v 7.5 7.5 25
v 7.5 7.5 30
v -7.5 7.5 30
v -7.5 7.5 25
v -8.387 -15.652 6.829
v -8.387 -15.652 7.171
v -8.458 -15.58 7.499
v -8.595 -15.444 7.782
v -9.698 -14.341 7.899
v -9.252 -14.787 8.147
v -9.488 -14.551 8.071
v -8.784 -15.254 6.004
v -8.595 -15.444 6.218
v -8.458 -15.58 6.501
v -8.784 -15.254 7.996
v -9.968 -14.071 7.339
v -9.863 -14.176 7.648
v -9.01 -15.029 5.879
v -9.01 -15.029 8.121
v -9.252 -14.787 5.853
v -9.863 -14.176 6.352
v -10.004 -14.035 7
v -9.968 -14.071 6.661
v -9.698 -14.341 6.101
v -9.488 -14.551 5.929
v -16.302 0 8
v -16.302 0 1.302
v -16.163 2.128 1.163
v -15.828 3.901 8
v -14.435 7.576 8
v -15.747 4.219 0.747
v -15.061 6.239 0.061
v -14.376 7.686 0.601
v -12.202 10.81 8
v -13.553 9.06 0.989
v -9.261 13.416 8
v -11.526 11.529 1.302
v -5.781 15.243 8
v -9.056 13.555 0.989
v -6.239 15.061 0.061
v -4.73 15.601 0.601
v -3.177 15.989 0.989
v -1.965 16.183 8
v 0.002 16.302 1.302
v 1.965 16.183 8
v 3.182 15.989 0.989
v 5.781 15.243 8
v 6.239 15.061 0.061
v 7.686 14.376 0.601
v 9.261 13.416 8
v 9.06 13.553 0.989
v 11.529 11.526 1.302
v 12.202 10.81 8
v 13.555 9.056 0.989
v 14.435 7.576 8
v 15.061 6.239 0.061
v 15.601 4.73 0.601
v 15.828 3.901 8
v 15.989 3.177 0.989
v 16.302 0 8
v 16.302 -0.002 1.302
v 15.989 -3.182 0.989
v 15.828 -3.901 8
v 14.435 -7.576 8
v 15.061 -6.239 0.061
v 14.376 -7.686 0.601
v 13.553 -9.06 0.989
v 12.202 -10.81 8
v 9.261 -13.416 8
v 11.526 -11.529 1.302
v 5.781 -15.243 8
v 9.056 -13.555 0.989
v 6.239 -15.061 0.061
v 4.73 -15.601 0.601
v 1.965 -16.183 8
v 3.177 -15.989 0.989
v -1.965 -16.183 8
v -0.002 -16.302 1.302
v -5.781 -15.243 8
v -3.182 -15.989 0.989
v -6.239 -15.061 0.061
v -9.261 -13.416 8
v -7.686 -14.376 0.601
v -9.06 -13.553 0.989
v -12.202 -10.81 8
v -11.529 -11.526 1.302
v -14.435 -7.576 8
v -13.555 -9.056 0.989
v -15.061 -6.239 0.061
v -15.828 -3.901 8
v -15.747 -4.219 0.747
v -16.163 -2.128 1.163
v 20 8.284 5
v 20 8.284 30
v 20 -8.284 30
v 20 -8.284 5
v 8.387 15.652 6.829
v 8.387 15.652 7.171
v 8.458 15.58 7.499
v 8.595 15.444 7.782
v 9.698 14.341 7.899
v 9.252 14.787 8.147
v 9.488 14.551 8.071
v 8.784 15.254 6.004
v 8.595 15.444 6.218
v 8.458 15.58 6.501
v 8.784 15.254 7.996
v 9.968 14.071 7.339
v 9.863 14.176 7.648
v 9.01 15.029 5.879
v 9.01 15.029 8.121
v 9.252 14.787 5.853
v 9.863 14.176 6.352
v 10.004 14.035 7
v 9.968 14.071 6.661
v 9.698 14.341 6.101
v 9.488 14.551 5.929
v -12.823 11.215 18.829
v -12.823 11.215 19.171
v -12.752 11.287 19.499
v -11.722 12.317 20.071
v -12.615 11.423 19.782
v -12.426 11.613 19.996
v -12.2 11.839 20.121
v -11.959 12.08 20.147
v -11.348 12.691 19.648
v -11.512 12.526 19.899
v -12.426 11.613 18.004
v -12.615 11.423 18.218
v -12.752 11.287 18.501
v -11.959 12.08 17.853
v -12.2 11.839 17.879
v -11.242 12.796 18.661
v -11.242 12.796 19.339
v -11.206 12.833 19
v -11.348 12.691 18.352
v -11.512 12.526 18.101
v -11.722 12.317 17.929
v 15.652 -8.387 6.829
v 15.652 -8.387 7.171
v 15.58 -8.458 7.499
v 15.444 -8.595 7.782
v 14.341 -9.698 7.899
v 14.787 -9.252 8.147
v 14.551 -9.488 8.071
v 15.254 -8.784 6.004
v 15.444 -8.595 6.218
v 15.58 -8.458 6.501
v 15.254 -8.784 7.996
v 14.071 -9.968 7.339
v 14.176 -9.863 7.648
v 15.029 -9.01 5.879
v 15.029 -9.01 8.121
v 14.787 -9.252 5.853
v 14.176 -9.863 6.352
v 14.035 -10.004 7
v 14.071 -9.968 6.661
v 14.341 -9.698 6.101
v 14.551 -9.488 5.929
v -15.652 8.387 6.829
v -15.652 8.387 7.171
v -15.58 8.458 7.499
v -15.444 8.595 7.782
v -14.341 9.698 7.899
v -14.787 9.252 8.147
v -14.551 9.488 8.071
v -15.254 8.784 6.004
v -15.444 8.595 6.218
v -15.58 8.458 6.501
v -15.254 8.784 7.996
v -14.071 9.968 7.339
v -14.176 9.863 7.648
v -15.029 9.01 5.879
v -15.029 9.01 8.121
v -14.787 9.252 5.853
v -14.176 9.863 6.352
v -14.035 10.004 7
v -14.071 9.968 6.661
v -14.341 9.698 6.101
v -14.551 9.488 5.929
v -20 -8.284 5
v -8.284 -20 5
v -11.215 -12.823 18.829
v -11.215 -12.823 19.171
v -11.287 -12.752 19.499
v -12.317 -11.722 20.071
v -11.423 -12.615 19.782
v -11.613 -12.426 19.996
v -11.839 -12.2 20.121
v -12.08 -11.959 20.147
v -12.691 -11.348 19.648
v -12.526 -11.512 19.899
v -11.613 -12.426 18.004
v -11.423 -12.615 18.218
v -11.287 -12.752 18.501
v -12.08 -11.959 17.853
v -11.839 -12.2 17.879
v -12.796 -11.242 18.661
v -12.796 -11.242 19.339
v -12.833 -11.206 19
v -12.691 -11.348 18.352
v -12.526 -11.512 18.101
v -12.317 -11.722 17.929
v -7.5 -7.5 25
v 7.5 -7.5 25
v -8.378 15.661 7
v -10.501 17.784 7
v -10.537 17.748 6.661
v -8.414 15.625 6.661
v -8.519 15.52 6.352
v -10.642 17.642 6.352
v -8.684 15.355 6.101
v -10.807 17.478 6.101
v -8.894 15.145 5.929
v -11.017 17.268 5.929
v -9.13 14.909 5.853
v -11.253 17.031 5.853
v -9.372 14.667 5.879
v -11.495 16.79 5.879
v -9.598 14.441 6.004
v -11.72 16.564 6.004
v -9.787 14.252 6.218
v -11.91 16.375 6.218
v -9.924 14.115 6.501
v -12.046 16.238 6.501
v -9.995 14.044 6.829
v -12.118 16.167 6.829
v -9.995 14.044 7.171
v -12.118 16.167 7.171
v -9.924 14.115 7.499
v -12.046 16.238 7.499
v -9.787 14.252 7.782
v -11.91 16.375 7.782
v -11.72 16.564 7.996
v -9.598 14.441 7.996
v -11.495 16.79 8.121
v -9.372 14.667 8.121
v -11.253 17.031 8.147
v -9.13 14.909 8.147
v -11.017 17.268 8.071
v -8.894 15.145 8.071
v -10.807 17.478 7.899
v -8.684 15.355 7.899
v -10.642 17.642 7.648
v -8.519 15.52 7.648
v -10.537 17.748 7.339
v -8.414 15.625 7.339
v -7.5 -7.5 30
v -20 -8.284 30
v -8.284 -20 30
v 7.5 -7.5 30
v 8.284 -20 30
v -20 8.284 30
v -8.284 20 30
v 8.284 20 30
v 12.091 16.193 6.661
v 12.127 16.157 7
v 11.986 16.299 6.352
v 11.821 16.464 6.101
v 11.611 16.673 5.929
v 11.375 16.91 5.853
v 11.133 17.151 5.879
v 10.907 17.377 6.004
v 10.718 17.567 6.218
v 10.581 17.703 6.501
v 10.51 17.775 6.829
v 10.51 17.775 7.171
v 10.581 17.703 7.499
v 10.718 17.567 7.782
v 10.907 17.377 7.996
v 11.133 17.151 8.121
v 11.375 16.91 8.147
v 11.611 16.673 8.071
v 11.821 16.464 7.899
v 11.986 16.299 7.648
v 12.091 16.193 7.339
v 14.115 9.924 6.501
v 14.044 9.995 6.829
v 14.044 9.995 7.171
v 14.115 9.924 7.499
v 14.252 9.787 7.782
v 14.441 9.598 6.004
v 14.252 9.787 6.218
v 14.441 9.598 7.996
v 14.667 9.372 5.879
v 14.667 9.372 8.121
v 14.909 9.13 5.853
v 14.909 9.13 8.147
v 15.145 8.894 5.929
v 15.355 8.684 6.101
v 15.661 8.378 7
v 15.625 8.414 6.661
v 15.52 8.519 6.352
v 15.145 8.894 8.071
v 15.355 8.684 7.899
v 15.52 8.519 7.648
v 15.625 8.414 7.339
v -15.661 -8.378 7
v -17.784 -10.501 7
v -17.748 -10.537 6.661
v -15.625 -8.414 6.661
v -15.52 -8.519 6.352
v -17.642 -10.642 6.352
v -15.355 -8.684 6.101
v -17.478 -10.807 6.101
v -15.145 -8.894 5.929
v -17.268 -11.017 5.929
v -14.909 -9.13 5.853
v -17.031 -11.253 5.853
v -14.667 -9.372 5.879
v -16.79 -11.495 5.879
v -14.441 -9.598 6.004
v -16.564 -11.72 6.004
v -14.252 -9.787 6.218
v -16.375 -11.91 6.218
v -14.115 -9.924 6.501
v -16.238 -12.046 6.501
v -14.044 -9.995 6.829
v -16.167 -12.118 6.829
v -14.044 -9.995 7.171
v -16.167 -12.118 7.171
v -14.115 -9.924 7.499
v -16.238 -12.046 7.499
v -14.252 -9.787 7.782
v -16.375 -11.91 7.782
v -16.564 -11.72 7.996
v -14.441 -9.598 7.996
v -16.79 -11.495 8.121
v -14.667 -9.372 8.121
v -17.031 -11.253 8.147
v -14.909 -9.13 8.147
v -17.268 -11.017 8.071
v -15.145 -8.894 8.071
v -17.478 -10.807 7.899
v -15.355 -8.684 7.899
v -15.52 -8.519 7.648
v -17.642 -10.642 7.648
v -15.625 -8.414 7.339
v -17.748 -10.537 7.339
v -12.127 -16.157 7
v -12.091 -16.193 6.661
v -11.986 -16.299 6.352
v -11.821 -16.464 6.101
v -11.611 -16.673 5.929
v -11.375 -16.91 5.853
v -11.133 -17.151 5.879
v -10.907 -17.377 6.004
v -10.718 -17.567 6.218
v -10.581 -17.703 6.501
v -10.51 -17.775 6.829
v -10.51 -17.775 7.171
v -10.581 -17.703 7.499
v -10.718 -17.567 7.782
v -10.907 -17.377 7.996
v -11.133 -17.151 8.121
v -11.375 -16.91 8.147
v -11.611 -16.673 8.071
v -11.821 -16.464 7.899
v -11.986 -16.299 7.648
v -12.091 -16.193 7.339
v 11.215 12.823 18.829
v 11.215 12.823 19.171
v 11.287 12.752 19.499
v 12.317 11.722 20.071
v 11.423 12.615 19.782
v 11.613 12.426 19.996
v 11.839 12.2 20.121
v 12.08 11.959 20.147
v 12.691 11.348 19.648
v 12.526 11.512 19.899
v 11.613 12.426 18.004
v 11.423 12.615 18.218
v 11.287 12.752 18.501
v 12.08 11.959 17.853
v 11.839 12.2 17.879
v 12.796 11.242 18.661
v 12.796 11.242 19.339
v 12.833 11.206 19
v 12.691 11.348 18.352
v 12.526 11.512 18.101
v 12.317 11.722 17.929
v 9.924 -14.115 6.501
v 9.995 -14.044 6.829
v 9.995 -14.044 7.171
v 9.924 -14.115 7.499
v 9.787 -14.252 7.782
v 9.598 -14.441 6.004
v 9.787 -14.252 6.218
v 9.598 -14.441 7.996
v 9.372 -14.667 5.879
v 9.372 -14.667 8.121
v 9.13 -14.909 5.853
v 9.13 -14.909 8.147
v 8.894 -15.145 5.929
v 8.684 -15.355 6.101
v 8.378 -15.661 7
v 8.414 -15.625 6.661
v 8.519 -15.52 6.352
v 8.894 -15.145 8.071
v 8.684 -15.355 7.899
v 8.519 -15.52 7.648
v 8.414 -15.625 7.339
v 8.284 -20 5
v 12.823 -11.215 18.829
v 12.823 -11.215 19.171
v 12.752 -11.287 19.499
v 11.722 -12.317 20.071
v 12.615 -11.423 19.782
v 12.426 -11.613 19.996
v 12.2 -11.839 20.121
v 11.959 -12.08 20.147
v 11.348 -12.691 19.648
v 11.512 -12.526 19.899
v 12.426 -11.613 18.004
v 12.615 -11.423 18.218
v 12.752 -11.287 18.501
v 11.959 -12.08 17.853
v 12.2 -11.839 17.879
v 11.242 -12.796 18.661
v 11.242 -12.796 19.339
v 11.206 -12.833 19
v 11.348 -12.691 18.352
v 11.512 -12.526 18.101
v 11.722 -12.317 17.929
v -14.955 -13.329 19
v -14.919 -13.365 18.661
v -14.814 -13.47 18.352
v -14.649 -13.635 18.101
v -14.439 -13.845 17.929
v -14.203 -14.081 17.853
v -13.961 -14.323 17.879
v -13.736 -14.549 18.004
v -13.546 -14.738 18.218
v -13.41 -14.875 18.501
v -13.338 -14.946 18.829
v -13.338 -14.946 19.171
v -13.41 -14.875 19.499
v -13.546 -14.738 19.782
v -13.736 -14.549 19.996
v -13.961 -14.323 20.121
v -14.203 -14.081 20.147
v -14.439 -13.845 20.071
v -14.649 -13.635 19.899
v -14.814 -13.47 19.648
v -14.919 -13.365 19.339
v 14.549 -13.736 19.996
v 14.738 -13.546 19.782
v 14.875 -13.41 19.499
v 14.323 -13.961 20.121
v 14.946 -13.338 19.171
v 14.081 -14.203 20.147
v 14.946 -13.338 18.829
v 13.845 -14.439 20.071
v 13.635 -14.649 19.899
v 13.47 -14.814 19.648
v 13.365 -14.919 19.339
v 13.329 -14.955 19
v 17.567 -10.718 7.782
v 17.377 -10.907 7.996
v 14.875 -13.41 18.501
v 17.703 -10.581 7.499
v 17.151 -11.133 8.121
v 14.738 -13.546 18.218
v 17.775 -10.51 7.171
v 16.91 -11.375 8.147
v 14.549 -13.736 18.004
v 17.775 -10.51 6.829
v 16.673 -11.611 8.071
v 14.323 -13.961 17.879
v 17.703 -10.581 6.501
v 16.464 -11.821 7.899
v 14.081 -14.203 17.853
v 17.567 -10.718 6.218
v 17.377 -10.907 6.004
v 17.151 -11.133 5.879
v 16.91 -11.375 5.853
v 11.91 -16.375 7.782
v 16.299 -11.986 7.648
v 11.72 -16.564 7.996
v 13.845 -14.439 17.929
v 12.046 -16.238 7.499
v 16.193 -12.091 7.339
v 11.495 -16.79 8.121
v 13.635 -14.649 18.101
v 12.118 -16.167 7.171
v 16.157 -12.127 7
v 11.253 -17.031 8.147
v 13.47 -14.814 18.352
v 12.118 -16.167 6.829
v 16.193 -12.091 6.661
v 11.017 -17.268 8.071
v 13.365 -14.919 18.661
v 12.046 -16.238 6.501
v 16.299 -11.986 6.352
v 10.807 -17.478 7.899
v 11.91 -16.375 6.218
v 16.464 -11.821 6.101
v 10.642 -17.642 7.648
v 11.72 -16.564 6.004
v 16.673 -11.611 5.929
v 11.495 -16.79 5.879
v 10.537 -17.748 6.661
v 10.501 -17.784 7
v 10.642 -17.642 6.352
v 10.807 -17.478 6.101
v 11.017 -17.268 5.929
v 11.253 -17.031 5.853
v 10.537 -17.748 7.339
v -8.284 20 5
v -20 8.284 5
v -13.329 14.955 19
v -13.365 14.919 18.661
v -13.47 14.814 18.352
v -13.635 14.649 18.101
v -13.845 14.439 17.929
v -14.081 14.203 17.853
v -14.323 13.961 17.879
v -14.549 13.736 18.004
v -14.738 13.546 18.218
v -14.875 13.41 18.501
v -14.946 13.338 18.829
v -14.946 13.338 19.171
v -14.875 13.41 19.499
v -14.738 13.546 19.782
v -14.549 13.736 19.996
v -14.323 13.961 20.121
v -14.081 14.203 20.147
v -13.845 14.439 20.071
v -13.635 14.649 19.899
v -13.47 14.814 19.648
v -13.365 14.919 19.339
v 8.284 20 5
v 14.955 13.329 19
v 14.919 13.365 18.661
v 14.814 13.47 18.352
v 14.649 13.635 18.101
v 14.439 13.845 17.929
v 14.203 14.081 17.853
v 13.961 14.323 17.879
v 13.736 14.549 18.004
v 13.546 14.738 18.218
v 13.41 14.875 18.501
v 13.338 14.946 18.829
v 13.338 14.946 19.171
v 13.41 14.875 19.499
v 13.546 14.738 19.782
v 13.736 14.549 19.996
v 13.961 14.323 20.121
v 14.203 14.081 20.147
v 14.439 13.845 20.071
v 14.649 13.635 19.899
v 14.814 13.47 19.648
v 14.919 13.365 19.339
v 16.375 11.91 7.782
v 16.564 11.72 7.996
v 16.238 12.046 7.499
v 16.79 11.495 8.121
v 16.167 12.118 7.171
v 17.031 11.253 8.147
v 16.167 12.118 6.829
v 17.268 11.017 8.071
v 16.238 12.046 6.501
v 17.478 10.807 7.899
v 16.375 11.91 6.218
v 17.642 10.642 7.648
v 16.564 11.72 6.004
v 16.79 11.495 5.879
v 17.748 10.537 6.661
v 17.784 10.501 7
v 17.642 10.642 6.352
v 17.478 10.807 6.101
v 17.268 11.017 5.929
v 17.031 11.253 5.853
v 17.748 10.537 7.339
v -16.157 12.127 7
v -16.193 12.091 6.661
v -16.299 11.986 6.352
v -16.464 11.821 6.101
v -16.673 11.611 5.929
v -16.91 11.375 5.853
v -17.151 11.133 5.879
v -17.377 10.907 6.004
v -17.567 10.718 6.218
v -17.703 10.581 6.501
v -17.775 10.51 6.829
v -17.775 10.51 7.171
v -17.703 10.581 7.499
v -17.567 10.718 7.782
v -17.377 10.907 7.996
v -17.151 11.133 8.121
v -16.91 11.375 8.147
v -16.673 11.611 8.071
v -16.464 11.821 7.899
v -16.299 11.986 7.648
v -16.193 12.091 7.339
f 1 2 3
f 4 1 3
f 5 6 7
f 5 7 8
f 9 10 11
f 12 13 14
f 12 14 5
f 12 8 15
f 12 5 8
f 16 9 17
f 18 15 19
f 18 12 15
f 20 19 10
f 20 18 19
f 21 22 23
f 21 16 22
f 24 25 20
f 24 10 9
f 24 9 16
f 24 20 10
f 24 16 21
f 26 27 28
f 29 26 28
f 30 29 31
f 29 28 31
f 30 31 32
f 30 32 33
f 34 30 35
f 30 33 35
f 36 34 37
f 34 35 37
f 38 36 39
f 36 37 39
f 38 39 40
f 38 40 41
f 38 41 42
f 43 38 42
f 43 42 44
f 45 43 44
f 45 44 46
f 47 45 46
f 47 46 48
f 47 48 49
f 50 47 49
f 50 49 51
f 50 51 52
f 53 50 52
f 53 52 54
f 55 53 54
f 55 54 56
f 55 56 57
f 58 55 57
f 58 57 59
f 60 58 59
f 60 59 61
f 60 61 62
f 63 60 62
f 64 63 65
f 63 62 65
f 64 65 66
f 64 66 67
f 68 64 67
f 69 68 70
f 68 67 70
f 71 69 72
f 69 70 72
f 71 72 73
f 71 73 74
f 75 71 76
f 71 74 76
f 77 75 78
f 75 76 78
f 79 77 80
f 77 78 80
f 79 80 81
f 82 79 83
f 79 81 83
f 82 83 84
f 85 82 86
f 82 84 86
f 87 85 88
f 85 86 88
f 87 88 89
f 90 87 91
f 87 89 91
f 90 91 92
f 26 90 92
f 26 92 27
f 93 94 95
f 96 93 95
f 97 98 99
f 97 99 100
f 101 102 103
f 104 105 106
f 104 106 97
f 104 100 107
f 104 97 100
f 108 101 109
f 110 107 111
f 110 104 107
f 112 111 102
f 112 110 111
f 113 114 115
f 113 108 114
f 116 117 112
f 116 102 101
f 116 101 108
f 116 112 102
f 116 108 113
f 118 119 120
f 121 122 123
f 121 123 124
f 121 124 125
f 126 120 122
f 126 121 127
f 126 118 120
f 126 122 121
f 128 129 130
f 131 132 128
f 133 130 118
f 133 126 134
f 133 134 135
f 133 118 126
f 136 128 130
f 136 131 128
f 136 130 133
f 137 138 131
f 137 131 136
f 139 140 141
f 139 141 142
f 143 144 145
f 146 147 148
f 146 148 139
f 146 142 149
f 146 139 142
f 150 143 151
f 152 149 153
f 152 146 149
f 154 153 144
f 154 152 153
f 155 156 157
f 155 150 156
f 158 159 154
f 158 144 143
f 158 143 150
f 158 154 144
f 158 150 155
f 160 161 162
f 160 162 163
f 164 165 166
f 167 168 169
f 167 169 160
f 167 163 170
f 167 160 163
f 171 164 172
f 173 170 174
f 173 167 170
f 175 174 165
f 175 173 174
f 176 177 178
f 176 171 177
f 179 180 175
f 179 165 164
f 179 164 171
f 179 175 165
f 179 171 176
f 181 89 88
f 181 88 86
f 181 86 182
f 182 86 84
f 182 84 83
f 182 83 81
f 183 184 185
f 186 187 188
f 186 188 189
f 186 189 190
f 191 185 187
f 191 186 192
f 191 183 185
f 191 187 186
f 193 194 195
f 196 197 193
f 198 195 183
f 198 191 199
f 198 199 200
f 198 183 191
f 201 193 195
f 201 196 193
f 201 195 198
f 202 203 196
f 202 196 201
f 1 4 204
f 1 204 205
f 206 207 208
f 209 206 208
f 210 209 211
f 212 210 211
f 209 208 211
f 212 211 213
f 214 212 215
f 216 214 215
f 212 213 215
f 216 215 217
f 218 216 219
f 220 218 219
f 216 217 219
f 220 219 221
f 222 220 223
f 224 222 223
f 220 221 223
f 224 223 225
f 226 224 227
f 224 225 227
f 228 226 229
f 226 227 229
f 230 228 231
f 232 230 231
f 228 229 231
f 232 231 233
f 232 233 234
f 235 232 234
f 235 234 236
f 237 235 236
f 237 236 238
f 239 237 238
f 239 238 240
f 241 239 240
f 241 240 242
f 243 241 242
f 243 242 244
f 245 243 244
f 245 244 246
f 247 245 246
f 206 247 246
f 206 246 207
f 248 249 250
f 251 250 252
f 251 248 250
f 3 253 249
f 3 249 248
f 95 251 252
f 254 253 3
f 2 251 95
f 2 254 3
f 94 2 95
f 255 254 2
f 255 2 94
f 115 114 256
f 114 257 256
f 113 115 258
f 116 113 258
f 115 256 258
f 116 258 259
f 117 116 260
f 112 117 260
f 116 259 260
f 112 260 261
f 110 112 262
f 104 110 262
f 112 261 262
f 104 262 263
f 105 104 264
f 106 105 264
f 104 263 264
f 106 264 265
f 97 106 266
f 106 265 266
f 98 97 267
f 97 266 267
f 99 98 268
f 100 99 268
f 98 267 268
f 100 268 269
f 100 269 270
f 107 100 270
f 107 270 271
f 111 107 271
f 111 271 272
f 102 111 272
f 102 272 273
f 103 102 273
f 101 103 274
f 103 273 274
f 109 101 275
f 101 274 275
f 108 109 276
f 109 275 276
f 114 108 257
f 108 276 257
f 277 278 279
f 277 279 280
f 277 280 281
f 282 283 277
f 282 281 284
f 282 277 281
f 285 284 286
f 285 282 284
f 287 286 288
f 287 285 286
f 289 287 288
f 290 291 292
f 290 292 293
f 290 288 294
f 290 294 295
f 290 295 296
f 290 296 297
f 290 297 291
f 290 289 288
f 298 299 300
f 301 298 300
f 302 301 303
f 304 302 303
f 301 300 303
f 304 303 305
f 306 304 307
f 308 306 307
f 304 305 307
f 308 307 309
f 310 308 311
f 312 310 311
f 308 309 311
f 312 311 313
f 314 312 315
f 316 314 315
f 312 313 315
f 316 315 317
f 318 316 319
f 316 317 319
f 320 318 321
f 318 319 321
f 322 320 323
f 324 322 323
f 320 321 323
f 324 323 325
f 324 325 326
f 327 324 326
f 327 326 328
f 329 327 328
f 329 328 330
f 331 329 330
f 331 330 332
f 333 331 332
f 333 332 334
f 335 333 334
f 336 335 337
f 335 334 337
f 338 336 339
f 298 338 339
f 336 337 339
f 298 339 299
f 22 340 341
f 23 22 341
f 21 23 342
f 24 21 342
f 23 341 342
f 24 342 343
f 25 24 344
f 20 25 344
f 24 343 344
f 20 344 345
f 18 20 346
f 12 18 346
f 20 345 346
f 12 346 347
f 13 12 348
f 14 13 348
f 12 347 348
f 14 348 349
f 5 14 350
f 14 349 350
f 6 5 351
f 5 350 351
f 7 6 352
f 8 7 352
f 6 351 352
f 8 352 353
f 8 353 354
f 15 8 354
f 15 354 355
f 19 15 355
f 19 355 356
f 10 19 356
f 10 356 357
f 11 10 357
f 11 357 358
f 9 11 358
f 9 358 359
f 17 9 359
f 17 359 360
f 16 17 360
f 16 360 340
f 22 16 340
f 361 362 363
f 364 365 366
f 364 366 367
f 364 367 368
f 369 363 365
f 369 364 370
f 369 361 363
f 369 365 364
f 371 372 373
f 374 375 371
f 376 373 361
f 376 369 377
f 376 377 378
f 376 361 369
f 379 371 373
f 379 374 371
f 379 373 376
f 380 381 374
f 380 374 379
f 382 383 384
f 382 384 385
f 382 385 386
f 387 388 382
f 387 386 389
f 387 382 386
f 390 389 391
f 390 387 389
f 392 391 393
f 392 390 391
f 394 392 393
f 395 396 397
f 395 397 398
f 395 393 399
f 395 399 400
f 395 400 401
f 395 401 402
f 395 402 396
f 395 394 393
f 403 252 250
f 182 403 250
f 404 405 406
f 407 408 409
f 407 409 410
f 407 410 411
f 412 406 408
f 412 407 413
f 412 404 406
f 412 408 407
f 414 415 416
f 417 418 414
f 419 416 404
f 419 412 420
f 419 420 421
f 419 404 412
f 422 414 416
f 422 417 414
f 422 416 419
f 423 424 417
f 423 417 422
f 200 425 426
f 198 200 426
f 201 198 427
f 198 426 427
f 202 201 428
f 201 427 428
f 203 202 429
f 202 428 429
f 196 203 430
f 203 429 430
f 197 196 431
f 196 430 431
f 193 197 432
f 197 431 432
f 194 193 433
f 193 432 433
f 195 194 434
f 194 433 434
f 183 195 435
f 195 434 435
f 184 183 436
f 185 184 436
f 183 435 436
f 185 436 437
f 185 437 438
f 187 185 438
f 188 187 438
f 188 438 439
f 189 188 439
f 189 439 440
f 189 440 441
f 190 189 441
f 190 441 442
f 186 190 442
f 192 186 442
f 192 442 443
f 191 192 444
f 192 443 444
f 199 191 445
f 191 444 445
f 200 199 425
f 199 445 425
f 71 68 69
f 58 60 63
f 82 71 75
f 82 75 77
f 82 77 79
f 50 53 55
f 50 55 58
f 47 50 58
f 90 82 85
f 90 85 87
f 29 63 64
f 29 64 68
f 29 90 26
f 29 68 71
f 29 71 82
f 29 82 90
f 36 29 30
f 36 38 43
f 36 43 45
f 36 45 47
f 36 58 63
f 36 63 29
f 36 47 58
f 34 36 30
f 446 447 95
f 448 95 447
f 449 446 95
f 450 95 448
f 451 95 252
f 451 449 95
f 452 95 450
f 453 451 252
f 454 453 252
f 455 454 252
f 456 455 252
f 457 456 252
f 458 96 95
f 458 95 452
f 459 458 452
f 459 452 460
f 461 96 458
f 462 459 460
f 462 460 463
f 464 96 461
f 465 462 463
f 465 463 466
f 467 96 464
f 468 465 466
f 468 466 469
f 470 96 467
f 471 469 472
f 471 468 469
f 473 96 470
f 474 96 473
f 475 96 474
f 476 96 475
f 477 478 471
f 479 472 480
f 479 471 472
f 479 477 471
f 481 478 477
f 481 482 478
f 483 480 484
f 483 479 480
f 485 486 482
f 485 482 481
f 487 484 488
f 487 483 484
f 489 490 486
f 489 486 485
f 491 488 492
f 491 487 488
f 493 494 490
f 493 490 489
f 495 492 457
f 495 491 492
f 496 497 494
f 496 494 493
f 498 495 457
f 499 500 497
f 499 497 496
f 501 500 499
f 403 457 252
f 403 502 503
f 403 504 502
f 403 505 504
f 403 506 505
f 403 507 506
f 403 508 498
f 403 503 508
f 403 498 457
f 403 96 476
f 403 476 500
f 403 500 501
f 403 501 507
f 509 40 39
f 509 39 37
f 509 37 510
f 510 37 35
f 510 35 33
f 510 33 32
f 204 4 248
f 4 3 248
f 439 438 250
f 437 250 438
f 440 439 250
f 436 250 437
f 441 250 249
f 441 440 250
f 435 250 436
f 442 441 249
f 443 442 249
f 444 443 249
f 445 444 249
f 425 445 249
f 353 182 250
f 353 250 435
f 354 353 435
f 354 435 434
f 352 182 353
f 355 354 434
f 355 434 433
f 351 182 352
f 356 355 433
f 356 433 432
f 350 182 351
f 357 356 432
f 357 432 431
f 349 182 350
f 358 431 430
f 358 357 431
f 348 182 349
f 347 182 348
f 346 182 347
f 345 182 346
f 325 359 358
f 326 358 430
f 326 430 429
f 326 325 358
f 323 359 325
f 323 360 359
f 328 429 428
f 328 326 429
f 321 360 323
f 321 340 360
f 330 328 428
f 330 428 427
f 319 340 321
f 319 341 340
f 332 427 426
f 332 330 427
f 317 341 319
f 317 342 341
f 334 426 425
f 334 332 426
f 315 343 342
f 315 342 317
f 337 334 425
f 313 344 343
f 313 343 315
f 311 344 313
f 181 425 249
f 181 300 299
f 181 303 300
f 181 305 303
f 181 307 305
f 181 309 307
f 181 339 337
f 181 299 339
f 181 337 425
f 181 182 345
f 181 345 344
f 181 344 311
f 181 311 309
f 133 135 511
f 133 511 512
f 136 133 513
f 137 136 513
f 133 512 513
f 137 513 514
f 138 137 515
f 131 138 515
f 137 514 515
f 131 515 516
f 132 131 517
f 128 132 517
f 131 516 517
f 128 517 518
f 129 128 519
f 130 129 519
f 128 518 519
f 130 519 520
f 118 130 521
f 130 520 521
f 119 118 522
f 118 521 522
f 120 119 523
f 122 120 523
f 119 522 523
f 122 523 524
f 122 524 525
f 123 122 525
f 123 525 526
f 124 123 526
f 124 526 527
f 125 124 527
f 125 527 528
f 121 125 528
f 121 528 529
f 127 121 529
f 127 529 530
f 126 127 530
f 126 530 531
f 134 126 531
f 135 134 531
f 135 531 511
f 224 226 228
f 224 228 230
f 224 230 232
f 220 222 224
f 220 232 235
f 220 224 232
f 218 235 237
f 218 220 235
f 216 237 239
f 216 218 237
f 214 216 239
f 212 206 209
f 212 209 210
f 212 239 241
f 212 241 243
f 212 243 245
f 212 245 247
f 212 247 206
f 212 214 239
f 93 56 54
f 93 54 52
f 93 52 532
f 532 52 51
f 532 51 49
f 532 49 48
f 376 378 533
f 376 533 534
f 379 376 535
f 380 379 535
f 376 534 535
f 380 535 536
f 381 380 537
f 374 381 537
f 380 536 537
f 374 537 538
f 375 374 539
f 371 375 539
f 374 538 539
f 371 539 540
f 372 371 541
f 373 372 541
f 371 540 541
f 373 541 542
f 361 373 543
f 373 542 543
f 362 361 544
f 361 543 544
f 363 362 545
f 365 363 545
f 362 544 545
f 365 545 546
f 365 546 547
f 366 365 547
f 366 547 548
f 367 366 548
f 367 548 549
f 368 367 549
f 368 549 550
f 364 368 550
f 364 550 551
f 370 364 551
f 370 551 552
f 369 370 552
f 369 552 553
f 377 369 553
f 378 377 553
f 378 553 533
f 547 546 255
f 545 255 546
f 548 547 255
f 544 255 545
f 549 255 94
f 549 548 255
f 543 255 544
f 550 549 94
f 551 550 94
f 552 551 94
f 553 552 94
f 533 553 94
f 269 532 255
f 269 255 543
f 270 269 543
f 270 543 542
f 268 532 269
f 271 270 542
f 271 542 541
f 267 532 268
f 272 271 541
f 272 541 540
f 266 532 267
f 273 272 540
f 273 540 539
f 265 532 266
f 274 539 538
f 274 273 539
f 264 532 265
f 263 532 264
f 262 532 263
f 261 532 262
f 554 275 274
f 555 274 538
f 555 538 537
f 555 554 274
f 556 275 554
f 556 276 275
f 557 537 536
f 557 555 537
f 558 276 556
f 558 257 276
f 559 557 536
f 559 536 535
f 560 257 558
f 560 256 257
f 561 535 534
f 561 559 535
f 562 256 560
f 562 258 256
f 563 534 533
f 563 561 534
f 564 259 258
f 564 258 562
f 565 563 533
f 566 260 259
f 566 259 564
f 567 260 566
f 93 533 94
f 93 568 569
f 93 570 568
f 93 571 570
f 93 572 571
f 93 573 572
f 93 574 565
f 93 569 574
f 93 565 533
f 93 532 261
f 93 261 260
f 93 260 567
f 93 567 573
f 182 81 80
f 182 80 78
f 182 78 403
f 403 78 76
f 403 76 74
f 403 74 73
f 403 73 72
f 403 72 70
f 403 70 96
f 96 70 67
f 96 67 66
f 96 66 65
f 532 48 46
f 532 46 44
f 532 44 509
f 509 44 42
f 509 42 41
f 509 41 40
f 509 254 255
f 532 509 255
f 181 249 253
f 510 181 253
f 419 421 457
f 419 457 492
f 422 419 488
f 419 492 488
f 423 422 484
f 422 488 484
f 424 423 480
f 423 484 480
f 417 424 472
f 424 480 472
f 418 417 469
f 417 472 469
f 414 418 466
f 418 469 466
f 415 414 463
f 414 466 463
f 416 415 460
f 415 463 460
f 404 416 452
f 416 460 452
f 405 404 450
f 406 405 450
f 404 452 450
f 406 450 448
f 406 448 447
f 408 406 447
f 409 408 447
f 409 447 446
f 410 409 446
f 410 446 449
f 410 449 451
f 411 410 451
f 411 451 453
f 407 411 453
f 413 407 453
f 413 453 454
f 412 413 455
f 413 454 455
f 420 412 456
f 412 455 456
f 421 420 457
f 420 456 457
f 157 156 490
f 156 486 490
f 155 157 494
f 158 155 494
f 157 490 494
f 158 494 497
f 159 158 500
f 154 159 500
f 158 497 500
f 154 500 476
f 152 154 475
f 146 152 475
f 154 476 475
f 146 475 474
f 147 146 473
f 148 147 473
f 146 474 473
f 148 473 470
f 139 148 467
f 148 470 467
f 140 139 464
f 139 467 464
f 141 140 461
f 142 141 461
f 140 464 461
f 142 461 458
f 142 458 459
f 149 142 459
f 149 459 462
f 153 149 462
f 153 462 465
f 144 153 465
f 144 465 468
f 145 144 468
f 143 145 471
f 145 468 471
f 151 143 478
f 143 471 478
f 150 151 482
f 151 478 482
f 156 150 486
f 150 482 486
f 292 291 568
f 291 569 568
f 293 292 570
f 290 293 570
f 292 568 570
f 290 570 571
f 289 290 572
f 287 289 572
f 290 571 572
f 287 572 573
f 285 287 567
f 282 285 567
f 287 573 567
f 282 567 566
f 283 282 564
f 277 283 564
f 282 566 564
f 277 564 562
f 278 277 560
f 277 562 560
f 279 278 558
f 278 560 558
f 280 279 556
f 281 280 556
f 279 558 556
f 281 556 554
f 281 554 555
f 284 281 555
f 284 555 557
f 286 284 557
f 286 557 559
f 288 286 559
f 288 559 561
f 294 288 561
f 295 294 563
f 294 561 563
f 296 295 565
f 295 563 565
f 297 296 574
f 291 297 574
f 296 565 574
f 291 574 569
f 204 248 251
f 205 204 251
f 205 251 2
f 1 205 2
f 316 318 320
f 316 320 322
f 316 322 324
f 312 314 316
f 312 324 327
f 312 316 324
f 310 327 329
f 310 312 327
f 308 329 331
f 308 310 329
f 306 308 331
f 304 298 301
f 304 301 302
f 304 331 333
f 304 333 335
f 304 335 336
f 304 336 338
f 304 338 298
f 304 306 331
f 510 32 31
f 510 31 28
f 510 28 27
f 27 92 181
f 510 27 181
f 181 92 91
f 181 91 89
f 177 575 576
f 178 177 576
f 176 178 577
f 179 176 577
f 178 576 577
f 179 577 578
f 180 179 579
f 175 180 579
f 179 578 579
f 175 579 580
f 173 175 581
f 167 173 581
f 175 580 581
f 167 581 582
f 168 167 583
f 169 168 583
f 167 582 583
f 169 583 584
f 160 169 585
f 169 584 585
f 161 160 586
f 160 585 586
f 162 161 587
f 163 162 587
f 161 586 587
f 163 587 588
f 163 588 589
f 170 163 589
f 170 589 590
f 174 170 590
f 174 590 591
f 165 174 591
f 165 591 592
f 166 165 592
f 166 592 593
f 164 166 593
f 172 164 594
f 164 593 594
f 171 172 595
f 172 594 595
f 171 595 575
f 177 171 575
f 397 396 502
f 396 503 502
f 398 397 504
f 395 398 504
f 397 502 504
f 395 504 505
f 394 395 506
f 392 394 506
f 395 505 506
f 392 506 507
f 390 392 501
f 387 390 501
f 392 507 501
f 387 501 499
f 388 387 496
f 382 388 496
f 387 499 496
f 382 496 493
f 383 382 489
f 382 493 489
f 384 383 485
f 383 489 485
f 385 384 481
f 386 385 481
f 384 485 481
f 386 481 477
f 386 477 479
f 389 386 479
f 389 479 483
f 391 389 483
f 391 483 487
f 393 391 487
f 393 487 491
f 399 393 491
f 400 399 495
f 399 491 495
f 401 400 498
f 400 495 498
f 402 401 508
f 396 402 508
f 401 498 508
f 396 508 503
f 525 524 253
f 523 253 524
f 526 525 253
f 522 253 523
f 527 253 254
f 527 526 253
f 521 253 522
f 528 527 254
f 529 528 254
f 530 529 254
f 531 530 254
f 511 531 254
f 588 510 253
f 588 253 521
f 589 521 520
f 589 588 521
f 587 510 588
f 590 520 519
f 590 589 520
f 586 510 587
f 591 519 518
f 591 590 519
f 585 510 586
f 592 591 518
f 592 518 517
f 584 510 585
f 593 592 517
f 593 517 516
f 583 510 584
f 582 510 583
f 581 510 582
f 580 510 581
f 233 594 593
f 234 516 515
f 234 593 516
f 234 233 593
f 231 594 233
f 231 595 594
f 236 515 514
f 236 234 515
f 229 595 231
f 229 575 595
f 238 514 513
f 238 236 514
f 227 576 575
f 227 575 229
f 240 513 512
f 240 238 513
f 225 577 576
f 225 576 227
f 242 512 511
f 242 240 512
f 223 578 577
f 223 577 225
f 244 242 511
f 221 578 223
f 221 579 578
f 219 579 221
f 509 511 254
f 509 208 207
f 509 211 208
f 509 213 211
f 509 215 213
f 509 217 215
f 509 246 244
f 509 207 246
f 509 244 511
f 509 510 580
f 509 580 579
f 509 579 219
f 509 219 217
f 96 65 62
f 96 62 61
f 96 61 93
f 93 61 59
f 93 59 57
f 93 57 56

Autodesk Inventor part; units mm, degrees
ref_plane "YZ Plane" through (0, 0, 0) normal (1, 0, 0) x (0, 1, 0)
ref_plane "XZ Plane" through (0, 0, 0) normal (0, 1, 0) x (-1, 0, 0)
ref_plane "XY Plane" through (0, 0, 0) normal (0, 0, 1) x (1, 0, 0)
sketch "Sketch1" plane through (0, 0, 0) normal (0, 0, 1) x (1, 0, 0)
  circle A0 centre (0, 0) radius 16.002 construction
  line L0 (8.2843, 20) -> (20, 8.2843)
  line L1 (20, 8.2843) -> (20, -8.2843)
  line L2 (20, -8.2843) -> (8.2843, -20)
  line L3 (8.2843, -20) -> (-8.2843, -20)
  line L4 (-8.2843, -20) -> (-20, -8.2843)
  line L5 (-20, -8.2843) -> (-20, 8.2843)
  line L6 (-20, 8.2843) -> (-8.2843, 20)
  line L7 (-8.2843, 20) -> (8.2843, 20)
  dimension "d0" = 32.004
  dimension "d2" = 40
extrude "Extrusion1" add sketch "Sketch1" along normal blind 30
chamfer "Chamfer1" distance 5 angle 45 8 edges at (-14.1421, 14.1421, 0) (-20, 0, 0) (-14.1421, -14.1421, 0) (0, -20, 0) (14.1421, -14.1421, 0) (20, 0, 0) (14.1421, 14.1421, 0) (0, 20, 0)
sketch "Sketch2" plane through (0, 0, 0) normal (0, 0, -1) x (-1, 0, 0)
  circle A0 centre (0, 0) radius 16.002 construction
  circle A1 centre (0, 0) radius 16.302
  dimension "d8" = 32.004
  dimension "d9" = 0.3
extrude "Extrusion2" cut sketch "Sketch2" against normal blind 8
sketch "Sketch4" plane through (0, 0, 30) normal (0, 0, 1) x (1, 0, 0)
  line L0 (-7.5, -7.5) -> (7.5, -7.5)
  line L1 (7.5, -7.5) -> (7.5, 7.5)
  line L2 (7.5, 7.5) -> (-7.5, 7.5)
  line L3 (-7.5, 7.5) -> (-7.5, -7.5)
  line L4 (-7.5, -7.5) -> (7.5, 7.5) construction
  line L5 (7.5, -7.5) -> (-7.5, 7.5) construction
  point P0 (0, 0)
  dimension "d18" = 15
  dimension "d19" = 15
extrude "Extrusion4" cut sketch "Sketch4" against normal blind 5
sketch "Sketch3" plane through (-8.2843, -20, 30) normal (-0.7071, -0.7071, 0) x (-0.7071, 0.7071, 0)
  line L0 (12.2843, 11) -> (4.2843, 11) construction
  line L1 (4.2843, 11) -> (4.2843, 23) construction
  line L2 (4.2843, 23) -> (12.2843, 23) construction
  line L3 (12.2843, 23) -> (12.2843, 11) construction
  line L4 (12.2843, 11) -> (4.2843, 23) construction
  line L5 (4.2843, 11) -> (12.2843, 23) construction
  line L6 (8.2843, 17) -> (8.2843, 30) construction
  circle A0 centre (8.2843, 11) radius 1.15
  circle A1 centre (12.2843, 23) radius 1.15
  circle A2 centre (4.2843, 23) radius 1.15
  dimension "d12" = 13
  dimension "d13" = 12
  dimension "d14" = 8
  dimension "d15" = 2.3
extrude "Extrusion3" cut sketch "Sketch3" against normal blind 3
pattern_circular "Circular Pattern1" count 4 over 360 about axis through (0, 0, -10) along (0, 0, 1) of "Extrusion3"
